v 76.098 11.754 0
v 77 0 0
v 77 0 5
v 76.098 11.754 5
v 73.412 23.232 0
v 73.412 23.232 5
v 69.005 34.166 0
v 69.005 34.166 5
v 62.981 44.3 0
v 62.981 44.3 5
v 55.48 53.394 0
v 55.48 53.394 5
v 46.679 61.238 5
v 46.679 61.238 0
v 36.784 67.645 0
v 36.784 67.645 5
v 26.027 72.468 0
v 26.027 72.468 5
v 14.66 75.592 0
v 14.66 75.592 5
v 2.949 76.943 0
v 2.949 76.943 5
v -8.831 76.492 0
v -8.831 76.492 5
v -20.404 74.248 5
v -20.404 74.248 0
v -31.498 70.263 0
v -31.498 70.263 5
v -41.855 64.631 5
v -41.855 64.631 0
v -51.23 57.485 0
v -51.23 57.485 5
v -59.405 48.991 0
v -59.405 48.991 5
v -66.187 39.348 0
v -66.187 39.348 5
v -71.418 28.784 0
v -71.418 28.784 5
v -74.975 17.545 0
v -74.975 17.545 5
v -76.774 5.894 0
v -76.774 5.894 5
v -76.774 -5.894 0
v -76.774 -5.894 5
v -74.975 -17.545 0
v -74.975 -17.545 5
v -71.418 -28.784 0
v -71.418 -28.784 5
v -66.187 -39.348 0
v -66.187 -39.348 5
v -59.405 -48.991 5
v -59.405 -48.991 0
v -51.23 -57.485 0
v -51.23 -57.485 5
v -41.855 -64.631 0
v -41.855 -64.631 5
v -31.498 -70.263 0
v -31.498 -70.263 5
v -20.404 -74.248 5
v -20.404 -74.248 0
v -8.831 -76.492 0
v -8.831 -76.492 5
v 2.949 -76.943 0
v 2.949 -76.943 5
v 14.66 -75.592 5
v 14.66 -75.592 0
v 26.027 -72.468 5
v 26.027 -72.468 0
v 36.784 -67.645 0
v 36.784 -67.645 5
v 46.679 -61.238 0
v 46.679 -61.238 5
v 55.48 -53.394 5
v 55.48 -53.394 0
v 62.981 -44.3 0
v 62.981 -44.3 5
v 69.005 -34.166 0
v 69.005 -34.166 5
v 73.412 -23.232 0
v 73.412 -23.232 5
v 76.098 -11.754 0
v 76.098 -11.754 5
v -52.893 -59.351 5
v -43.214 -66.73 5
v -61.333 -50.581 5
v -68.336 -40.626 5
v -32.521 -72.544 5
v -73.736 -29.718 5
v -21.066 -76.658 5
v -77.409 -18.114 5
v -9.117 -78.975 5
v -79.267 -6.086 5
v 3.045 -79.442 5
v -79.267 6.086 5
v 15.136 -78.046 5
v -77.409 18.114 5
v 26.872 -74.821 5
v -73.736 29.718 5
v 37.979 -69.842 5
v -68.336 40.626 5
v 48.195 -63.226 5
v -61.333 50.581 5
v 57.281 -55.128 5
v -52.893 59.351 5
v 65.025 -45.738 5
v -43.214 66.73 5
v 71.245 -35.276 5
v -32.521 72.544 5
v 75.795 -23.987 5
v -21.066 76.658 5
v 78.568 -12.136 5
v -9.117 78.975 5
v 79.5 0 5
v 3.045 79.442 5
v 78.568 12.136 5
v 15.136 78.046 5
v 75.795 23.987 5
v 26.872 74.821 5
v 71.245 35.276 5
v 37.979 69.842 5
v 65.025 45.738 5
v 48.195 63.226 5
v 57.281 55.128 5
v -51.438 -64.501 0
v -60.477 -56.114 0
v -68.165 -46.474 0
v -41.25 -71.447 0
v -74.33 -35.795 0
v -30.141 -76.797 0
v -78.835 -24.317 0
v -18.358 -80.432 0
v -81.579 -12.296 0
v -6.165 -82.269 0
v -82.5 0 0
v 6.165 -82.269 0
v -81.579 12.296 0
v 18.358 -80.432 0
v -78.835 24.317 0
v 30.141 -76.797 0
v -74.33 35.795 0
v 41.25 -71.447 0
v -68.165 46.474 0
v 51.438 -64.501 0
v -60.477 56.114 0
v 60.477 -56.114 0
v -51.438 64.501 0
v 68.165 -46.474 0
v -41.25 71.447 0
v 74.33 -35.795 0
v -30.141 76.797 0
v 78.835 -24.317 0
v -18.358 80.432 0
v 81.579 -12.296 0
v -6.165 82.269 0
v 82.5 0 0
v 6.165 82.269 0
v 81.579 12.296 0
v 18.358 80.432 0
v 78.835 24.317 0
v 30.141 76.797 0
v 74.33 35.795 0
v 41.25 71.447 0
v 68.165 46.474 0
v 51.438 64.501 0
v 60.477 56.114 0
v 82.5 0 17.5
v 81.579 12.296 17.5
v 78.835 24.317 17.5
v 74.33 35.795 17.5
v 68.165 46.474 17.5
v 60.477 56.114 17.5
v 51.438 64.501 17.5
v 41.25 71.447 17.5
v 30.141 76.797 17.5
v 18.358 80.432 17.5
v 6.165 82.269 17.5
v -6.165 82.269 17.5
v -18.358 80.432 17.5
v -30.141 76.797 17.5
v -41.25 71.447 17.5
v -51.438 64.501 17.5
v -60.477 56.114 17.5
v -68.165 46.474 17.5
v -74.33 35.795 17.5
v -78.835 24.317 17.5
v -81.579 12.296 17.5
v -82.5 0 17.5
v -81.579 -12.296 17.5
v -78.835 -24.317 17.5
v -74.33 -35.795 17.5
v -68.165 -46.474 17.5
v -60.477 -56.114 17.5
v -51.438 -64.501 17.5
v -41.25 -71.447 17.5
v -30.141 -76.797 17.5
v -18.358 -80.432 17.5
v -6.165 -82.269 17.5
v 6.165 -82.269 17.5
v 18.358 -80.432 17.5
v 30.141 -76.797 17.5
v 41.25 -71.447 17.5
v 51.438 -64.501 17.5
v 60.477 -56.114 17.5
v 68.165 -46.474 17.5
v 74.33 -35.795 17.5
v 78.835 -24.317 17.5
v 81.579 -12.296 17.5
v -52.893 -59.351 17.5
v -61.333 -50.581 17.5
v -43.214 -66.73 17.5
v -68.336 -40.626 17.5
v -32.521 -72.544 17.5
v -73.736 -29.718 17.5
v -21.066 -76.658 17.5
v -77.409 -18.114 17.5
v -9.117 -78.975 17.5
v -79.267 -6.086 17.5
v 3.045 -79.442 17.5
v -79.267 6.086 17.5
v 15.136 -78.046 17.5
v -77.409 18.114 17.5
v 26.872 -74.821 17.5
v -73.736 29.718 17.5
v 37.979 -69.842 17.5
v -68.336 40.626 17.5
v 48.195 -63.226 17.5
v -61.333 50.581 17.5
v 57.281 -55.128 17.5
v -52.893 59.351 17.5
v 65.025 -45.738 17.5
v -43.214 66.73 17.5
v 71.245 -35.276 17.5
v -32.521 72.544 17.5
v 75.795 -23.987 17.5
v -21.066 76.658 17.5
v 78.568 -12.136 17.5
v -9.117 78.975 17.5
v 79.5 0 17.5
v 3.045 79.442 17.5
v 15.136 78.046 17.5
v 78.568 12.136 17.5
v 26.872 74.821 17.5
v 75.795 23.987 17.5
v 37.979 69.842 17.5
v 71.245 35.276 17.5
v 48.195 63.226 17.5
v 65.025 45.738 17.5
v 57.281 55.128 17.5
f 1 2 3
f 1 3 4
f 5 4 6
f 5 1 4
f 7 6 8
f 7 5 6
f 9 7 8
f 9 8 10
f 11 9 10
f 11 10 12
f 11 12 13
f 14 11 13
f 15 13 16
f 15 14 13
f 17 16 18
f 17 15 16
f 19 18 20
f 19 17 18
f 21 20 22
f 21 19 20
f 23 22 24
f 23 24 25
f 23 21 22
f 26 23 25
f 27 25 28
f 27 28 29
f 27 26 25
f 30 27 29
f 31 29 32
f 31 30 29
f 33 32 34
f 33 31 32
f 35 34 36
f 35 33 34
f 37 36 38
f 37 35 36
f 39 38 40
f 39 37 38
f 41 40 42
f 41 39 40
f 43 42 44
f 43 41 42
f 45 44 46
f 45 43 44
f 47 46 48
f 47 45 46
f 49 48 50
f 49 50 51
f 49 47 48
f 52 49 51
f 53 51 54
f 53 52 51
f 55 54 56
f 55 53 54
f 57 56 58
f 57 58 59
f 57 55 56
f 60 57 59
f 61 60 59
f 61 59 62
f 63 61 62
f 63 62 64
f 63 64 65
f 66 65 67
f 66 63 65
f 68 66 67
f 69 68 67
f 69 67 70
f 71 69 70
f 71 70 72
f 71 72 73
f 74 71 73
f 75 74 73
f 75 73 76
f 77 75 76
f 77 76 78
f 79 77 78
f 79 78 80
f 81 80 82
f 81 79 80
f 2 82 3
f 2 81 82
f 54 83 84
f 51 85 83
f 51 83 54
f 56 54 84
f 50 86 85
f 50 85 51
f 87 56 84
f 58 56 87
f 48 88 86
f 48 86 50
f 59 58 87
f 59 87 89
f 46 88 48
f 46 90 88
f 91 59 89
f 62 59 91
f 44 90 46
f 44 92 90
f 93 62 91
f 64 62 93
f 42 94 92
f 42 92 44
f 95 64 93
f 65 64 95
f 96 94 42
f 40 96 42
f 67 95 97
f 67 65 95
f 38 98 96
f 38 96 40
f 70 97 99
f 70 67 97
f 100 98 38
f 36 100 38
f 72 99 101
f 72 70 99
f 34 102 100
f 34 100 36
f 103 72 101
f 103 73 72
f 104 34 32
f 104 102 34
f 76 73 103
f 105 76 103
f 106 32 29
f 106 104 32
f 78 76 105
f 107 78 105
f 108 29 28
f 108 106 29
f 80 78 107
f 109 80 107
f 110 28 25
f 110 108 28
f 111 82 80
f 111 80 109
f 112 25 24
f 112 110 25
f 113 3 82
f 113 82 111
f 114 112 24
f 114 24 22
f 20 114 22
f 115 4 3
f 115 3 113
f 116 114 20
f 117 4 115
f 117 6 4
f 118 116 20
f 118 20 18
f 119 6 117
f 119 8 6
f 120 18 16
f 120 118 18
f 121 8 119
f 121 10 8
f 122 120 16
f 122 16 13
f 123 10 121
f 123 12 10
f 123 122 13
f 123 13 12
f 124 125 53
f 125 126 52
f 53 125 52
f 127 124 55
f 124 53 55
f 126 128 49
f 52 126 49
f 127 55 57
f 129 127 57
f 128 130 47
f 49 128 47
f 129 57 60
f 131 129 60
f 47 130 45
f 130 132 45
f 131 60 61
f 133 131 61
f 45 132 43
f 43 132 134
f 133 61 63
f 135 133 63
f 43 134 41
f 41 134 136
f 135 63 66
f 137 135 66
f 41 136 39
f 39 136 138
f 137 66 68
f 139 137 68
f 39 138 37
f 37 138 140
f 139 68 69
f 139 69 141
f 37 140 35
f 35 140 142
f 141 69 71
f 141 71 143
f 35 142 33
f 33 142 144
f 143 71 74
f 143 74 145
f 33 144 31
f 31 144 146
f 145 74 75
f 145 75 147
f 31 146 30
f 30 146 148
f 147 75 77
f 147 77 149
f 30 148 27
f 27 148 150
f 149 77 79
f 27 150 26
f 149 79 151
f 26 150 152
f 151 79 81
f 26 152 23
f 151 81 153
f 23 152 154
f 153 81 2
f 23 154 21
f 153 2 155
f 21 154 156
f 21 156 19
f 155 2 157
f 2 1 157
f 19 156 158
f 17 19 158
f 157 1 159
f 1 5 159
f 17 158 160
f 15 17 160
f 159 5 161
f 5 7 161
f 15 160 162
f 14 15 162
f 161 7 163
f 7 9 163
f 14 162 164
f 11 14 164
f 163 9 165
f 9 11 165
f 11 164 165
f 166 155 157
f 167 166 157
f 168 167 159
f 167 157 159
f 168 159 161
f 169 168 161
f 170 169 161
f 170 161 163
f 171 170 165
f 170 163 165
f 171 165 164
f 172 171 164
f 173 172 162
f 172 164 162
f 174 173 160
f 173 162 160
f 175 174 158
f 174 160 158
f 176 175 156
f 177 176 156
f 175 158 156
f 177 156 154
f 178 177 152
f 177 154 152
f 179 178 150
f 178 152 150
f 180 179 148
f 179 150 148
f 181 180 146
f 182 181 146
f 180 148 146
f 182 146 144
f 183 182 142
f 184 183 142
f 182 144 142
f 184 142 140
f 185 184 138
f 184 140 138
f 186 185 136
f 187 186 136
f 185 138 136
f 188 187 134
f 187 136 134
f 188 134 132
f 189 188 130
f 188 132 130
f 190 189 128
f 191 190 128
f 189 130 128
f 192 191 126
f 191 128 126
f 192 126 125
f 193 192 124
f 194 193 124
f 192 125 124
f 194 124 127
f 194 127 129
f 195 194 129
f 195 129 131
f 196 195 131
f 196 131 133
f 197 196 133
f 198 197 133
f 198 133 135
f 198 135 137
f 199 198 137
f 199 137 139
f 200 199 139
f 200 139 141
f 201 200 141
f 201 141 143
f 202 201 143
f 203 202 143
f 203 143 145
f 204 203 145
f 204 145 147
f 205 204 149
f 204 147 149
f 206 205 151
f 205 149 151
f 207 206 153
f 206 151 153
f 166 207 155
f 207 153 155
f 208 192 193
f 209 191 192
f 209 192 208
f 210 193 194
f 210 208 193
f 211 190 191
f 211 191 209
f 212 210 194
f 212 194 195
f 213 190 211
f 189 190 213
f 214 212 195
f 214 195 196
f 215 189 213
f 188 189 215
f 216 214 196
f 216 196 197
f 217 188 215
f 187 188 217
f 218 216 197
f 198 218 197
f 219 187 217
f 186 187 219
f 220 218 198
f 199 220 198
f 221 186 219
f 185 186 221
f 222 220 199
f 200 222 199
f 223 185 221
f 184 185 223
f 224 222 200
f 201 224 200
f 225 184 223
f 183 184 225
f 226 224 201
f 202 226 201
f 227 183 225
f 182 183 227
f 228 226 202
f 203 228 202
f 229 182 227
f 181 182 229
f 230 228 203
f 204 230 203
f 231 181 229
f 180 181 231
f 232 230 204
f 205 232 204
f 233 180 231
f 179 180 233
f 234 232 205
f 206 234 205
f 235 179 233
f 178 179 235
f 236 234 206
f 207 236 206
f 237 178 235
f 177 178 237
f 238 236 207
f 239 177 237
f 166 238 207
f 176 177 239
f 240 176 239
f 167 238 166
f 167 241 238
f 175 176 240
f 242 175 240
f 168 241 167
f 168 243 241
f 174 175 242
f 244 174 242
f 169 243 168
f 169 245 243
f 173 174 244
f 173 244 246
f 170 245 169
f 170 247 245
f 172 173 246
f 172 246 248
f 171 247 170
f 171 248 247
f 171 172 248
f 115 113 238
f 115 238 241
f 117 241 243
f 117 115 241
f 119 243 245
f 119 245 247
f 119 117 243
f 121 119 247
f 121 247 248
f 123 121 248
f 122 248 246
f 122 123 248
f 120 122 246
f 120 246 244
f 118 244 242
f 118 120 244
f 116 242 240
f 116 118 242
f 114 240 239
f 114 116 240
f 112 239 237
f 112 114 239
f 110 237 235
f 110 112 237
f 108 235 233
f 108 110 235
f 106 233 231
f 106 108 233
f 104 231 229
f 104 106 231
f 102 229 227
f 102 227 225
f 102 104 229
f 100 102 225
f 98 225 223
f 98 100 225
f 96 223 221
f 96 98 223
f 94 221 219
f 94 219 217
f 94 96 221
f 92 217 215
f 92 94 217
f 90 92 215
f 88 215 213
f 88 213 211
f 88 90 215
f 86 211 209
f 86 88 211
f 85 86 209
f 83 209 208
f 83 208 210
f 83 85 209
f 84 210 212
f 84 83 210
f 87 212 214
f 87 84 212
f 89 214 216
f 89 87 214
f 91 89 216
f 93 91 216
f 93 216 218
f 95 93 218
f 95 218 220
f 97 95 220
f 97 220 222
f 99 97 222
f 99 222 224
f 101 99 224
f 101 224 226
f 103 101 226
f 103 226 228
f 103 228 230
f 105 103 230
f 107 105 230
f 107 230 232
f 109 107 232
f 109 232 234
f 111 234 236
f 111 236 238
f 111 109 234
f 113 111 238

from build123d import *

# Parameters (mm, degrees)
CYLINDER_R        = 77
CYLINDER_DEPTH    = 5
CYLINDER001_R     = 79.5
CYLINDER001_DEPTH = 12.5
CYLINDER002_R     = 82.5
CYLINDER002_DEPTH = 17.5


with BuildPart() as cylinder:
    # Cylinder → Cylinder (new body)
    with BuildSketch(Plane.XY):
        Circle(CYLINDER_R)
    extrude(amount=CYLINDER_DEPTH)


with BuildPart() as fusion:
    # Cylinder001 → Cylinder001 (new body)
    with BuildSketch(Plane.XY.offset(5)):
        Circle(CYLINDER001_R)
    extrude(amount=CYLINDER001_DEPTH)

    # Fusion: union Cylinder
    add(cylinder.part)


with BuildPart() as attachmentseatrecess_noclamps:
    # Cylinder002 → Cylinder002 (new body)
    with BuildSketch(Plane.XY):
        Circle(CYLINDER002_R)
    extrude(amount=CYLINDER002_DEPTH)

    # Cut: cut Fusion
    add(fusion.part, mode=Mode.SUBTRACT)


solid = attachmentseatrecess_noclamps.part
